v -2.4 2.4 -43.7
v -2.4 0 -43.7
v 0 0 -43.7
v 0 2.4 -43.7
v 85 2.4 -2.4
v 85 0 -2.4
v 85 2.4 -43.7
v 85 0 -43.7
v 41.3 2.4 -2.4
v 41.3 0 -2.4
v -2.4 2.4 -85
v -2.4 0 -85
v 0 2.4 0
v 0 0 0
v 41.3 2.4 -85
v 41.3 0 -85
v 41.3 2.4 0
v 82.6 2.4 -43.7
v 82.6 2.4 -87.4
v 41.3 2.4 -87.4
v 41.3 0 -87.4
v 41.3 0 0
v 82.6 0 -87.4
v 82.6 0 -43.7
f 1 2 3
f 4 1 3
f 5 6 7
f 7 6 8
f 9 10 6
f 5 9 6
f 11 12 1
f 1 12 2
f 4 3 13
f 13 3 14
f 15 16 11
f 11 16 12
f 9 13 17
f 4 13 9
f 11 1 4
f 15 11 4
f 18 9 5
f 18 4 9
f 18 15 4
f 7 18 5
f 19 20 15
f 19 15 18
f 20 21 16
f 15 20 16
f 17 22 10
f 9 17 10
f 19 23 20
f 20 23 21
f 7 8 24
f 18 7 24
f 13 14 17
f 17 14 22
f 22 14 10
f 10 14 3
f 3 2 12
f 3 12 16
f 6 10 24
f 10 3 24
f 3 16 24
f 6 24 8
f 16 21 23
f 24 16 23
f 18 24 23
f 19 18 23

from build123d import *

# Parameters (mm, degrees)
P_IDAT_VYSUNUT_M1_DEPTH = 2.4


with BuildPart() as part:
    # Skica1 → Přidat vysunutím1 (new body)
    with BuildSketch(Plane(origin=(0, 0, 0), x_dir=(1, 0, 0), z_dir=(0, 1, 0))):
        Polygon((41.3, 87.4), (41.3, 85), (-2.4, 85), (-2.4, 43.7), (0, 43.7), (0, 0), (41.3, 0), (41.3, 2.4), (85, 2.4), (85, 43.7), (82.6, 43.7), (82.6, 87.4), align=None)
    extrude(amount=P_IDAT_VYSUNUT_M1_DEPTH)


solid = part.part
